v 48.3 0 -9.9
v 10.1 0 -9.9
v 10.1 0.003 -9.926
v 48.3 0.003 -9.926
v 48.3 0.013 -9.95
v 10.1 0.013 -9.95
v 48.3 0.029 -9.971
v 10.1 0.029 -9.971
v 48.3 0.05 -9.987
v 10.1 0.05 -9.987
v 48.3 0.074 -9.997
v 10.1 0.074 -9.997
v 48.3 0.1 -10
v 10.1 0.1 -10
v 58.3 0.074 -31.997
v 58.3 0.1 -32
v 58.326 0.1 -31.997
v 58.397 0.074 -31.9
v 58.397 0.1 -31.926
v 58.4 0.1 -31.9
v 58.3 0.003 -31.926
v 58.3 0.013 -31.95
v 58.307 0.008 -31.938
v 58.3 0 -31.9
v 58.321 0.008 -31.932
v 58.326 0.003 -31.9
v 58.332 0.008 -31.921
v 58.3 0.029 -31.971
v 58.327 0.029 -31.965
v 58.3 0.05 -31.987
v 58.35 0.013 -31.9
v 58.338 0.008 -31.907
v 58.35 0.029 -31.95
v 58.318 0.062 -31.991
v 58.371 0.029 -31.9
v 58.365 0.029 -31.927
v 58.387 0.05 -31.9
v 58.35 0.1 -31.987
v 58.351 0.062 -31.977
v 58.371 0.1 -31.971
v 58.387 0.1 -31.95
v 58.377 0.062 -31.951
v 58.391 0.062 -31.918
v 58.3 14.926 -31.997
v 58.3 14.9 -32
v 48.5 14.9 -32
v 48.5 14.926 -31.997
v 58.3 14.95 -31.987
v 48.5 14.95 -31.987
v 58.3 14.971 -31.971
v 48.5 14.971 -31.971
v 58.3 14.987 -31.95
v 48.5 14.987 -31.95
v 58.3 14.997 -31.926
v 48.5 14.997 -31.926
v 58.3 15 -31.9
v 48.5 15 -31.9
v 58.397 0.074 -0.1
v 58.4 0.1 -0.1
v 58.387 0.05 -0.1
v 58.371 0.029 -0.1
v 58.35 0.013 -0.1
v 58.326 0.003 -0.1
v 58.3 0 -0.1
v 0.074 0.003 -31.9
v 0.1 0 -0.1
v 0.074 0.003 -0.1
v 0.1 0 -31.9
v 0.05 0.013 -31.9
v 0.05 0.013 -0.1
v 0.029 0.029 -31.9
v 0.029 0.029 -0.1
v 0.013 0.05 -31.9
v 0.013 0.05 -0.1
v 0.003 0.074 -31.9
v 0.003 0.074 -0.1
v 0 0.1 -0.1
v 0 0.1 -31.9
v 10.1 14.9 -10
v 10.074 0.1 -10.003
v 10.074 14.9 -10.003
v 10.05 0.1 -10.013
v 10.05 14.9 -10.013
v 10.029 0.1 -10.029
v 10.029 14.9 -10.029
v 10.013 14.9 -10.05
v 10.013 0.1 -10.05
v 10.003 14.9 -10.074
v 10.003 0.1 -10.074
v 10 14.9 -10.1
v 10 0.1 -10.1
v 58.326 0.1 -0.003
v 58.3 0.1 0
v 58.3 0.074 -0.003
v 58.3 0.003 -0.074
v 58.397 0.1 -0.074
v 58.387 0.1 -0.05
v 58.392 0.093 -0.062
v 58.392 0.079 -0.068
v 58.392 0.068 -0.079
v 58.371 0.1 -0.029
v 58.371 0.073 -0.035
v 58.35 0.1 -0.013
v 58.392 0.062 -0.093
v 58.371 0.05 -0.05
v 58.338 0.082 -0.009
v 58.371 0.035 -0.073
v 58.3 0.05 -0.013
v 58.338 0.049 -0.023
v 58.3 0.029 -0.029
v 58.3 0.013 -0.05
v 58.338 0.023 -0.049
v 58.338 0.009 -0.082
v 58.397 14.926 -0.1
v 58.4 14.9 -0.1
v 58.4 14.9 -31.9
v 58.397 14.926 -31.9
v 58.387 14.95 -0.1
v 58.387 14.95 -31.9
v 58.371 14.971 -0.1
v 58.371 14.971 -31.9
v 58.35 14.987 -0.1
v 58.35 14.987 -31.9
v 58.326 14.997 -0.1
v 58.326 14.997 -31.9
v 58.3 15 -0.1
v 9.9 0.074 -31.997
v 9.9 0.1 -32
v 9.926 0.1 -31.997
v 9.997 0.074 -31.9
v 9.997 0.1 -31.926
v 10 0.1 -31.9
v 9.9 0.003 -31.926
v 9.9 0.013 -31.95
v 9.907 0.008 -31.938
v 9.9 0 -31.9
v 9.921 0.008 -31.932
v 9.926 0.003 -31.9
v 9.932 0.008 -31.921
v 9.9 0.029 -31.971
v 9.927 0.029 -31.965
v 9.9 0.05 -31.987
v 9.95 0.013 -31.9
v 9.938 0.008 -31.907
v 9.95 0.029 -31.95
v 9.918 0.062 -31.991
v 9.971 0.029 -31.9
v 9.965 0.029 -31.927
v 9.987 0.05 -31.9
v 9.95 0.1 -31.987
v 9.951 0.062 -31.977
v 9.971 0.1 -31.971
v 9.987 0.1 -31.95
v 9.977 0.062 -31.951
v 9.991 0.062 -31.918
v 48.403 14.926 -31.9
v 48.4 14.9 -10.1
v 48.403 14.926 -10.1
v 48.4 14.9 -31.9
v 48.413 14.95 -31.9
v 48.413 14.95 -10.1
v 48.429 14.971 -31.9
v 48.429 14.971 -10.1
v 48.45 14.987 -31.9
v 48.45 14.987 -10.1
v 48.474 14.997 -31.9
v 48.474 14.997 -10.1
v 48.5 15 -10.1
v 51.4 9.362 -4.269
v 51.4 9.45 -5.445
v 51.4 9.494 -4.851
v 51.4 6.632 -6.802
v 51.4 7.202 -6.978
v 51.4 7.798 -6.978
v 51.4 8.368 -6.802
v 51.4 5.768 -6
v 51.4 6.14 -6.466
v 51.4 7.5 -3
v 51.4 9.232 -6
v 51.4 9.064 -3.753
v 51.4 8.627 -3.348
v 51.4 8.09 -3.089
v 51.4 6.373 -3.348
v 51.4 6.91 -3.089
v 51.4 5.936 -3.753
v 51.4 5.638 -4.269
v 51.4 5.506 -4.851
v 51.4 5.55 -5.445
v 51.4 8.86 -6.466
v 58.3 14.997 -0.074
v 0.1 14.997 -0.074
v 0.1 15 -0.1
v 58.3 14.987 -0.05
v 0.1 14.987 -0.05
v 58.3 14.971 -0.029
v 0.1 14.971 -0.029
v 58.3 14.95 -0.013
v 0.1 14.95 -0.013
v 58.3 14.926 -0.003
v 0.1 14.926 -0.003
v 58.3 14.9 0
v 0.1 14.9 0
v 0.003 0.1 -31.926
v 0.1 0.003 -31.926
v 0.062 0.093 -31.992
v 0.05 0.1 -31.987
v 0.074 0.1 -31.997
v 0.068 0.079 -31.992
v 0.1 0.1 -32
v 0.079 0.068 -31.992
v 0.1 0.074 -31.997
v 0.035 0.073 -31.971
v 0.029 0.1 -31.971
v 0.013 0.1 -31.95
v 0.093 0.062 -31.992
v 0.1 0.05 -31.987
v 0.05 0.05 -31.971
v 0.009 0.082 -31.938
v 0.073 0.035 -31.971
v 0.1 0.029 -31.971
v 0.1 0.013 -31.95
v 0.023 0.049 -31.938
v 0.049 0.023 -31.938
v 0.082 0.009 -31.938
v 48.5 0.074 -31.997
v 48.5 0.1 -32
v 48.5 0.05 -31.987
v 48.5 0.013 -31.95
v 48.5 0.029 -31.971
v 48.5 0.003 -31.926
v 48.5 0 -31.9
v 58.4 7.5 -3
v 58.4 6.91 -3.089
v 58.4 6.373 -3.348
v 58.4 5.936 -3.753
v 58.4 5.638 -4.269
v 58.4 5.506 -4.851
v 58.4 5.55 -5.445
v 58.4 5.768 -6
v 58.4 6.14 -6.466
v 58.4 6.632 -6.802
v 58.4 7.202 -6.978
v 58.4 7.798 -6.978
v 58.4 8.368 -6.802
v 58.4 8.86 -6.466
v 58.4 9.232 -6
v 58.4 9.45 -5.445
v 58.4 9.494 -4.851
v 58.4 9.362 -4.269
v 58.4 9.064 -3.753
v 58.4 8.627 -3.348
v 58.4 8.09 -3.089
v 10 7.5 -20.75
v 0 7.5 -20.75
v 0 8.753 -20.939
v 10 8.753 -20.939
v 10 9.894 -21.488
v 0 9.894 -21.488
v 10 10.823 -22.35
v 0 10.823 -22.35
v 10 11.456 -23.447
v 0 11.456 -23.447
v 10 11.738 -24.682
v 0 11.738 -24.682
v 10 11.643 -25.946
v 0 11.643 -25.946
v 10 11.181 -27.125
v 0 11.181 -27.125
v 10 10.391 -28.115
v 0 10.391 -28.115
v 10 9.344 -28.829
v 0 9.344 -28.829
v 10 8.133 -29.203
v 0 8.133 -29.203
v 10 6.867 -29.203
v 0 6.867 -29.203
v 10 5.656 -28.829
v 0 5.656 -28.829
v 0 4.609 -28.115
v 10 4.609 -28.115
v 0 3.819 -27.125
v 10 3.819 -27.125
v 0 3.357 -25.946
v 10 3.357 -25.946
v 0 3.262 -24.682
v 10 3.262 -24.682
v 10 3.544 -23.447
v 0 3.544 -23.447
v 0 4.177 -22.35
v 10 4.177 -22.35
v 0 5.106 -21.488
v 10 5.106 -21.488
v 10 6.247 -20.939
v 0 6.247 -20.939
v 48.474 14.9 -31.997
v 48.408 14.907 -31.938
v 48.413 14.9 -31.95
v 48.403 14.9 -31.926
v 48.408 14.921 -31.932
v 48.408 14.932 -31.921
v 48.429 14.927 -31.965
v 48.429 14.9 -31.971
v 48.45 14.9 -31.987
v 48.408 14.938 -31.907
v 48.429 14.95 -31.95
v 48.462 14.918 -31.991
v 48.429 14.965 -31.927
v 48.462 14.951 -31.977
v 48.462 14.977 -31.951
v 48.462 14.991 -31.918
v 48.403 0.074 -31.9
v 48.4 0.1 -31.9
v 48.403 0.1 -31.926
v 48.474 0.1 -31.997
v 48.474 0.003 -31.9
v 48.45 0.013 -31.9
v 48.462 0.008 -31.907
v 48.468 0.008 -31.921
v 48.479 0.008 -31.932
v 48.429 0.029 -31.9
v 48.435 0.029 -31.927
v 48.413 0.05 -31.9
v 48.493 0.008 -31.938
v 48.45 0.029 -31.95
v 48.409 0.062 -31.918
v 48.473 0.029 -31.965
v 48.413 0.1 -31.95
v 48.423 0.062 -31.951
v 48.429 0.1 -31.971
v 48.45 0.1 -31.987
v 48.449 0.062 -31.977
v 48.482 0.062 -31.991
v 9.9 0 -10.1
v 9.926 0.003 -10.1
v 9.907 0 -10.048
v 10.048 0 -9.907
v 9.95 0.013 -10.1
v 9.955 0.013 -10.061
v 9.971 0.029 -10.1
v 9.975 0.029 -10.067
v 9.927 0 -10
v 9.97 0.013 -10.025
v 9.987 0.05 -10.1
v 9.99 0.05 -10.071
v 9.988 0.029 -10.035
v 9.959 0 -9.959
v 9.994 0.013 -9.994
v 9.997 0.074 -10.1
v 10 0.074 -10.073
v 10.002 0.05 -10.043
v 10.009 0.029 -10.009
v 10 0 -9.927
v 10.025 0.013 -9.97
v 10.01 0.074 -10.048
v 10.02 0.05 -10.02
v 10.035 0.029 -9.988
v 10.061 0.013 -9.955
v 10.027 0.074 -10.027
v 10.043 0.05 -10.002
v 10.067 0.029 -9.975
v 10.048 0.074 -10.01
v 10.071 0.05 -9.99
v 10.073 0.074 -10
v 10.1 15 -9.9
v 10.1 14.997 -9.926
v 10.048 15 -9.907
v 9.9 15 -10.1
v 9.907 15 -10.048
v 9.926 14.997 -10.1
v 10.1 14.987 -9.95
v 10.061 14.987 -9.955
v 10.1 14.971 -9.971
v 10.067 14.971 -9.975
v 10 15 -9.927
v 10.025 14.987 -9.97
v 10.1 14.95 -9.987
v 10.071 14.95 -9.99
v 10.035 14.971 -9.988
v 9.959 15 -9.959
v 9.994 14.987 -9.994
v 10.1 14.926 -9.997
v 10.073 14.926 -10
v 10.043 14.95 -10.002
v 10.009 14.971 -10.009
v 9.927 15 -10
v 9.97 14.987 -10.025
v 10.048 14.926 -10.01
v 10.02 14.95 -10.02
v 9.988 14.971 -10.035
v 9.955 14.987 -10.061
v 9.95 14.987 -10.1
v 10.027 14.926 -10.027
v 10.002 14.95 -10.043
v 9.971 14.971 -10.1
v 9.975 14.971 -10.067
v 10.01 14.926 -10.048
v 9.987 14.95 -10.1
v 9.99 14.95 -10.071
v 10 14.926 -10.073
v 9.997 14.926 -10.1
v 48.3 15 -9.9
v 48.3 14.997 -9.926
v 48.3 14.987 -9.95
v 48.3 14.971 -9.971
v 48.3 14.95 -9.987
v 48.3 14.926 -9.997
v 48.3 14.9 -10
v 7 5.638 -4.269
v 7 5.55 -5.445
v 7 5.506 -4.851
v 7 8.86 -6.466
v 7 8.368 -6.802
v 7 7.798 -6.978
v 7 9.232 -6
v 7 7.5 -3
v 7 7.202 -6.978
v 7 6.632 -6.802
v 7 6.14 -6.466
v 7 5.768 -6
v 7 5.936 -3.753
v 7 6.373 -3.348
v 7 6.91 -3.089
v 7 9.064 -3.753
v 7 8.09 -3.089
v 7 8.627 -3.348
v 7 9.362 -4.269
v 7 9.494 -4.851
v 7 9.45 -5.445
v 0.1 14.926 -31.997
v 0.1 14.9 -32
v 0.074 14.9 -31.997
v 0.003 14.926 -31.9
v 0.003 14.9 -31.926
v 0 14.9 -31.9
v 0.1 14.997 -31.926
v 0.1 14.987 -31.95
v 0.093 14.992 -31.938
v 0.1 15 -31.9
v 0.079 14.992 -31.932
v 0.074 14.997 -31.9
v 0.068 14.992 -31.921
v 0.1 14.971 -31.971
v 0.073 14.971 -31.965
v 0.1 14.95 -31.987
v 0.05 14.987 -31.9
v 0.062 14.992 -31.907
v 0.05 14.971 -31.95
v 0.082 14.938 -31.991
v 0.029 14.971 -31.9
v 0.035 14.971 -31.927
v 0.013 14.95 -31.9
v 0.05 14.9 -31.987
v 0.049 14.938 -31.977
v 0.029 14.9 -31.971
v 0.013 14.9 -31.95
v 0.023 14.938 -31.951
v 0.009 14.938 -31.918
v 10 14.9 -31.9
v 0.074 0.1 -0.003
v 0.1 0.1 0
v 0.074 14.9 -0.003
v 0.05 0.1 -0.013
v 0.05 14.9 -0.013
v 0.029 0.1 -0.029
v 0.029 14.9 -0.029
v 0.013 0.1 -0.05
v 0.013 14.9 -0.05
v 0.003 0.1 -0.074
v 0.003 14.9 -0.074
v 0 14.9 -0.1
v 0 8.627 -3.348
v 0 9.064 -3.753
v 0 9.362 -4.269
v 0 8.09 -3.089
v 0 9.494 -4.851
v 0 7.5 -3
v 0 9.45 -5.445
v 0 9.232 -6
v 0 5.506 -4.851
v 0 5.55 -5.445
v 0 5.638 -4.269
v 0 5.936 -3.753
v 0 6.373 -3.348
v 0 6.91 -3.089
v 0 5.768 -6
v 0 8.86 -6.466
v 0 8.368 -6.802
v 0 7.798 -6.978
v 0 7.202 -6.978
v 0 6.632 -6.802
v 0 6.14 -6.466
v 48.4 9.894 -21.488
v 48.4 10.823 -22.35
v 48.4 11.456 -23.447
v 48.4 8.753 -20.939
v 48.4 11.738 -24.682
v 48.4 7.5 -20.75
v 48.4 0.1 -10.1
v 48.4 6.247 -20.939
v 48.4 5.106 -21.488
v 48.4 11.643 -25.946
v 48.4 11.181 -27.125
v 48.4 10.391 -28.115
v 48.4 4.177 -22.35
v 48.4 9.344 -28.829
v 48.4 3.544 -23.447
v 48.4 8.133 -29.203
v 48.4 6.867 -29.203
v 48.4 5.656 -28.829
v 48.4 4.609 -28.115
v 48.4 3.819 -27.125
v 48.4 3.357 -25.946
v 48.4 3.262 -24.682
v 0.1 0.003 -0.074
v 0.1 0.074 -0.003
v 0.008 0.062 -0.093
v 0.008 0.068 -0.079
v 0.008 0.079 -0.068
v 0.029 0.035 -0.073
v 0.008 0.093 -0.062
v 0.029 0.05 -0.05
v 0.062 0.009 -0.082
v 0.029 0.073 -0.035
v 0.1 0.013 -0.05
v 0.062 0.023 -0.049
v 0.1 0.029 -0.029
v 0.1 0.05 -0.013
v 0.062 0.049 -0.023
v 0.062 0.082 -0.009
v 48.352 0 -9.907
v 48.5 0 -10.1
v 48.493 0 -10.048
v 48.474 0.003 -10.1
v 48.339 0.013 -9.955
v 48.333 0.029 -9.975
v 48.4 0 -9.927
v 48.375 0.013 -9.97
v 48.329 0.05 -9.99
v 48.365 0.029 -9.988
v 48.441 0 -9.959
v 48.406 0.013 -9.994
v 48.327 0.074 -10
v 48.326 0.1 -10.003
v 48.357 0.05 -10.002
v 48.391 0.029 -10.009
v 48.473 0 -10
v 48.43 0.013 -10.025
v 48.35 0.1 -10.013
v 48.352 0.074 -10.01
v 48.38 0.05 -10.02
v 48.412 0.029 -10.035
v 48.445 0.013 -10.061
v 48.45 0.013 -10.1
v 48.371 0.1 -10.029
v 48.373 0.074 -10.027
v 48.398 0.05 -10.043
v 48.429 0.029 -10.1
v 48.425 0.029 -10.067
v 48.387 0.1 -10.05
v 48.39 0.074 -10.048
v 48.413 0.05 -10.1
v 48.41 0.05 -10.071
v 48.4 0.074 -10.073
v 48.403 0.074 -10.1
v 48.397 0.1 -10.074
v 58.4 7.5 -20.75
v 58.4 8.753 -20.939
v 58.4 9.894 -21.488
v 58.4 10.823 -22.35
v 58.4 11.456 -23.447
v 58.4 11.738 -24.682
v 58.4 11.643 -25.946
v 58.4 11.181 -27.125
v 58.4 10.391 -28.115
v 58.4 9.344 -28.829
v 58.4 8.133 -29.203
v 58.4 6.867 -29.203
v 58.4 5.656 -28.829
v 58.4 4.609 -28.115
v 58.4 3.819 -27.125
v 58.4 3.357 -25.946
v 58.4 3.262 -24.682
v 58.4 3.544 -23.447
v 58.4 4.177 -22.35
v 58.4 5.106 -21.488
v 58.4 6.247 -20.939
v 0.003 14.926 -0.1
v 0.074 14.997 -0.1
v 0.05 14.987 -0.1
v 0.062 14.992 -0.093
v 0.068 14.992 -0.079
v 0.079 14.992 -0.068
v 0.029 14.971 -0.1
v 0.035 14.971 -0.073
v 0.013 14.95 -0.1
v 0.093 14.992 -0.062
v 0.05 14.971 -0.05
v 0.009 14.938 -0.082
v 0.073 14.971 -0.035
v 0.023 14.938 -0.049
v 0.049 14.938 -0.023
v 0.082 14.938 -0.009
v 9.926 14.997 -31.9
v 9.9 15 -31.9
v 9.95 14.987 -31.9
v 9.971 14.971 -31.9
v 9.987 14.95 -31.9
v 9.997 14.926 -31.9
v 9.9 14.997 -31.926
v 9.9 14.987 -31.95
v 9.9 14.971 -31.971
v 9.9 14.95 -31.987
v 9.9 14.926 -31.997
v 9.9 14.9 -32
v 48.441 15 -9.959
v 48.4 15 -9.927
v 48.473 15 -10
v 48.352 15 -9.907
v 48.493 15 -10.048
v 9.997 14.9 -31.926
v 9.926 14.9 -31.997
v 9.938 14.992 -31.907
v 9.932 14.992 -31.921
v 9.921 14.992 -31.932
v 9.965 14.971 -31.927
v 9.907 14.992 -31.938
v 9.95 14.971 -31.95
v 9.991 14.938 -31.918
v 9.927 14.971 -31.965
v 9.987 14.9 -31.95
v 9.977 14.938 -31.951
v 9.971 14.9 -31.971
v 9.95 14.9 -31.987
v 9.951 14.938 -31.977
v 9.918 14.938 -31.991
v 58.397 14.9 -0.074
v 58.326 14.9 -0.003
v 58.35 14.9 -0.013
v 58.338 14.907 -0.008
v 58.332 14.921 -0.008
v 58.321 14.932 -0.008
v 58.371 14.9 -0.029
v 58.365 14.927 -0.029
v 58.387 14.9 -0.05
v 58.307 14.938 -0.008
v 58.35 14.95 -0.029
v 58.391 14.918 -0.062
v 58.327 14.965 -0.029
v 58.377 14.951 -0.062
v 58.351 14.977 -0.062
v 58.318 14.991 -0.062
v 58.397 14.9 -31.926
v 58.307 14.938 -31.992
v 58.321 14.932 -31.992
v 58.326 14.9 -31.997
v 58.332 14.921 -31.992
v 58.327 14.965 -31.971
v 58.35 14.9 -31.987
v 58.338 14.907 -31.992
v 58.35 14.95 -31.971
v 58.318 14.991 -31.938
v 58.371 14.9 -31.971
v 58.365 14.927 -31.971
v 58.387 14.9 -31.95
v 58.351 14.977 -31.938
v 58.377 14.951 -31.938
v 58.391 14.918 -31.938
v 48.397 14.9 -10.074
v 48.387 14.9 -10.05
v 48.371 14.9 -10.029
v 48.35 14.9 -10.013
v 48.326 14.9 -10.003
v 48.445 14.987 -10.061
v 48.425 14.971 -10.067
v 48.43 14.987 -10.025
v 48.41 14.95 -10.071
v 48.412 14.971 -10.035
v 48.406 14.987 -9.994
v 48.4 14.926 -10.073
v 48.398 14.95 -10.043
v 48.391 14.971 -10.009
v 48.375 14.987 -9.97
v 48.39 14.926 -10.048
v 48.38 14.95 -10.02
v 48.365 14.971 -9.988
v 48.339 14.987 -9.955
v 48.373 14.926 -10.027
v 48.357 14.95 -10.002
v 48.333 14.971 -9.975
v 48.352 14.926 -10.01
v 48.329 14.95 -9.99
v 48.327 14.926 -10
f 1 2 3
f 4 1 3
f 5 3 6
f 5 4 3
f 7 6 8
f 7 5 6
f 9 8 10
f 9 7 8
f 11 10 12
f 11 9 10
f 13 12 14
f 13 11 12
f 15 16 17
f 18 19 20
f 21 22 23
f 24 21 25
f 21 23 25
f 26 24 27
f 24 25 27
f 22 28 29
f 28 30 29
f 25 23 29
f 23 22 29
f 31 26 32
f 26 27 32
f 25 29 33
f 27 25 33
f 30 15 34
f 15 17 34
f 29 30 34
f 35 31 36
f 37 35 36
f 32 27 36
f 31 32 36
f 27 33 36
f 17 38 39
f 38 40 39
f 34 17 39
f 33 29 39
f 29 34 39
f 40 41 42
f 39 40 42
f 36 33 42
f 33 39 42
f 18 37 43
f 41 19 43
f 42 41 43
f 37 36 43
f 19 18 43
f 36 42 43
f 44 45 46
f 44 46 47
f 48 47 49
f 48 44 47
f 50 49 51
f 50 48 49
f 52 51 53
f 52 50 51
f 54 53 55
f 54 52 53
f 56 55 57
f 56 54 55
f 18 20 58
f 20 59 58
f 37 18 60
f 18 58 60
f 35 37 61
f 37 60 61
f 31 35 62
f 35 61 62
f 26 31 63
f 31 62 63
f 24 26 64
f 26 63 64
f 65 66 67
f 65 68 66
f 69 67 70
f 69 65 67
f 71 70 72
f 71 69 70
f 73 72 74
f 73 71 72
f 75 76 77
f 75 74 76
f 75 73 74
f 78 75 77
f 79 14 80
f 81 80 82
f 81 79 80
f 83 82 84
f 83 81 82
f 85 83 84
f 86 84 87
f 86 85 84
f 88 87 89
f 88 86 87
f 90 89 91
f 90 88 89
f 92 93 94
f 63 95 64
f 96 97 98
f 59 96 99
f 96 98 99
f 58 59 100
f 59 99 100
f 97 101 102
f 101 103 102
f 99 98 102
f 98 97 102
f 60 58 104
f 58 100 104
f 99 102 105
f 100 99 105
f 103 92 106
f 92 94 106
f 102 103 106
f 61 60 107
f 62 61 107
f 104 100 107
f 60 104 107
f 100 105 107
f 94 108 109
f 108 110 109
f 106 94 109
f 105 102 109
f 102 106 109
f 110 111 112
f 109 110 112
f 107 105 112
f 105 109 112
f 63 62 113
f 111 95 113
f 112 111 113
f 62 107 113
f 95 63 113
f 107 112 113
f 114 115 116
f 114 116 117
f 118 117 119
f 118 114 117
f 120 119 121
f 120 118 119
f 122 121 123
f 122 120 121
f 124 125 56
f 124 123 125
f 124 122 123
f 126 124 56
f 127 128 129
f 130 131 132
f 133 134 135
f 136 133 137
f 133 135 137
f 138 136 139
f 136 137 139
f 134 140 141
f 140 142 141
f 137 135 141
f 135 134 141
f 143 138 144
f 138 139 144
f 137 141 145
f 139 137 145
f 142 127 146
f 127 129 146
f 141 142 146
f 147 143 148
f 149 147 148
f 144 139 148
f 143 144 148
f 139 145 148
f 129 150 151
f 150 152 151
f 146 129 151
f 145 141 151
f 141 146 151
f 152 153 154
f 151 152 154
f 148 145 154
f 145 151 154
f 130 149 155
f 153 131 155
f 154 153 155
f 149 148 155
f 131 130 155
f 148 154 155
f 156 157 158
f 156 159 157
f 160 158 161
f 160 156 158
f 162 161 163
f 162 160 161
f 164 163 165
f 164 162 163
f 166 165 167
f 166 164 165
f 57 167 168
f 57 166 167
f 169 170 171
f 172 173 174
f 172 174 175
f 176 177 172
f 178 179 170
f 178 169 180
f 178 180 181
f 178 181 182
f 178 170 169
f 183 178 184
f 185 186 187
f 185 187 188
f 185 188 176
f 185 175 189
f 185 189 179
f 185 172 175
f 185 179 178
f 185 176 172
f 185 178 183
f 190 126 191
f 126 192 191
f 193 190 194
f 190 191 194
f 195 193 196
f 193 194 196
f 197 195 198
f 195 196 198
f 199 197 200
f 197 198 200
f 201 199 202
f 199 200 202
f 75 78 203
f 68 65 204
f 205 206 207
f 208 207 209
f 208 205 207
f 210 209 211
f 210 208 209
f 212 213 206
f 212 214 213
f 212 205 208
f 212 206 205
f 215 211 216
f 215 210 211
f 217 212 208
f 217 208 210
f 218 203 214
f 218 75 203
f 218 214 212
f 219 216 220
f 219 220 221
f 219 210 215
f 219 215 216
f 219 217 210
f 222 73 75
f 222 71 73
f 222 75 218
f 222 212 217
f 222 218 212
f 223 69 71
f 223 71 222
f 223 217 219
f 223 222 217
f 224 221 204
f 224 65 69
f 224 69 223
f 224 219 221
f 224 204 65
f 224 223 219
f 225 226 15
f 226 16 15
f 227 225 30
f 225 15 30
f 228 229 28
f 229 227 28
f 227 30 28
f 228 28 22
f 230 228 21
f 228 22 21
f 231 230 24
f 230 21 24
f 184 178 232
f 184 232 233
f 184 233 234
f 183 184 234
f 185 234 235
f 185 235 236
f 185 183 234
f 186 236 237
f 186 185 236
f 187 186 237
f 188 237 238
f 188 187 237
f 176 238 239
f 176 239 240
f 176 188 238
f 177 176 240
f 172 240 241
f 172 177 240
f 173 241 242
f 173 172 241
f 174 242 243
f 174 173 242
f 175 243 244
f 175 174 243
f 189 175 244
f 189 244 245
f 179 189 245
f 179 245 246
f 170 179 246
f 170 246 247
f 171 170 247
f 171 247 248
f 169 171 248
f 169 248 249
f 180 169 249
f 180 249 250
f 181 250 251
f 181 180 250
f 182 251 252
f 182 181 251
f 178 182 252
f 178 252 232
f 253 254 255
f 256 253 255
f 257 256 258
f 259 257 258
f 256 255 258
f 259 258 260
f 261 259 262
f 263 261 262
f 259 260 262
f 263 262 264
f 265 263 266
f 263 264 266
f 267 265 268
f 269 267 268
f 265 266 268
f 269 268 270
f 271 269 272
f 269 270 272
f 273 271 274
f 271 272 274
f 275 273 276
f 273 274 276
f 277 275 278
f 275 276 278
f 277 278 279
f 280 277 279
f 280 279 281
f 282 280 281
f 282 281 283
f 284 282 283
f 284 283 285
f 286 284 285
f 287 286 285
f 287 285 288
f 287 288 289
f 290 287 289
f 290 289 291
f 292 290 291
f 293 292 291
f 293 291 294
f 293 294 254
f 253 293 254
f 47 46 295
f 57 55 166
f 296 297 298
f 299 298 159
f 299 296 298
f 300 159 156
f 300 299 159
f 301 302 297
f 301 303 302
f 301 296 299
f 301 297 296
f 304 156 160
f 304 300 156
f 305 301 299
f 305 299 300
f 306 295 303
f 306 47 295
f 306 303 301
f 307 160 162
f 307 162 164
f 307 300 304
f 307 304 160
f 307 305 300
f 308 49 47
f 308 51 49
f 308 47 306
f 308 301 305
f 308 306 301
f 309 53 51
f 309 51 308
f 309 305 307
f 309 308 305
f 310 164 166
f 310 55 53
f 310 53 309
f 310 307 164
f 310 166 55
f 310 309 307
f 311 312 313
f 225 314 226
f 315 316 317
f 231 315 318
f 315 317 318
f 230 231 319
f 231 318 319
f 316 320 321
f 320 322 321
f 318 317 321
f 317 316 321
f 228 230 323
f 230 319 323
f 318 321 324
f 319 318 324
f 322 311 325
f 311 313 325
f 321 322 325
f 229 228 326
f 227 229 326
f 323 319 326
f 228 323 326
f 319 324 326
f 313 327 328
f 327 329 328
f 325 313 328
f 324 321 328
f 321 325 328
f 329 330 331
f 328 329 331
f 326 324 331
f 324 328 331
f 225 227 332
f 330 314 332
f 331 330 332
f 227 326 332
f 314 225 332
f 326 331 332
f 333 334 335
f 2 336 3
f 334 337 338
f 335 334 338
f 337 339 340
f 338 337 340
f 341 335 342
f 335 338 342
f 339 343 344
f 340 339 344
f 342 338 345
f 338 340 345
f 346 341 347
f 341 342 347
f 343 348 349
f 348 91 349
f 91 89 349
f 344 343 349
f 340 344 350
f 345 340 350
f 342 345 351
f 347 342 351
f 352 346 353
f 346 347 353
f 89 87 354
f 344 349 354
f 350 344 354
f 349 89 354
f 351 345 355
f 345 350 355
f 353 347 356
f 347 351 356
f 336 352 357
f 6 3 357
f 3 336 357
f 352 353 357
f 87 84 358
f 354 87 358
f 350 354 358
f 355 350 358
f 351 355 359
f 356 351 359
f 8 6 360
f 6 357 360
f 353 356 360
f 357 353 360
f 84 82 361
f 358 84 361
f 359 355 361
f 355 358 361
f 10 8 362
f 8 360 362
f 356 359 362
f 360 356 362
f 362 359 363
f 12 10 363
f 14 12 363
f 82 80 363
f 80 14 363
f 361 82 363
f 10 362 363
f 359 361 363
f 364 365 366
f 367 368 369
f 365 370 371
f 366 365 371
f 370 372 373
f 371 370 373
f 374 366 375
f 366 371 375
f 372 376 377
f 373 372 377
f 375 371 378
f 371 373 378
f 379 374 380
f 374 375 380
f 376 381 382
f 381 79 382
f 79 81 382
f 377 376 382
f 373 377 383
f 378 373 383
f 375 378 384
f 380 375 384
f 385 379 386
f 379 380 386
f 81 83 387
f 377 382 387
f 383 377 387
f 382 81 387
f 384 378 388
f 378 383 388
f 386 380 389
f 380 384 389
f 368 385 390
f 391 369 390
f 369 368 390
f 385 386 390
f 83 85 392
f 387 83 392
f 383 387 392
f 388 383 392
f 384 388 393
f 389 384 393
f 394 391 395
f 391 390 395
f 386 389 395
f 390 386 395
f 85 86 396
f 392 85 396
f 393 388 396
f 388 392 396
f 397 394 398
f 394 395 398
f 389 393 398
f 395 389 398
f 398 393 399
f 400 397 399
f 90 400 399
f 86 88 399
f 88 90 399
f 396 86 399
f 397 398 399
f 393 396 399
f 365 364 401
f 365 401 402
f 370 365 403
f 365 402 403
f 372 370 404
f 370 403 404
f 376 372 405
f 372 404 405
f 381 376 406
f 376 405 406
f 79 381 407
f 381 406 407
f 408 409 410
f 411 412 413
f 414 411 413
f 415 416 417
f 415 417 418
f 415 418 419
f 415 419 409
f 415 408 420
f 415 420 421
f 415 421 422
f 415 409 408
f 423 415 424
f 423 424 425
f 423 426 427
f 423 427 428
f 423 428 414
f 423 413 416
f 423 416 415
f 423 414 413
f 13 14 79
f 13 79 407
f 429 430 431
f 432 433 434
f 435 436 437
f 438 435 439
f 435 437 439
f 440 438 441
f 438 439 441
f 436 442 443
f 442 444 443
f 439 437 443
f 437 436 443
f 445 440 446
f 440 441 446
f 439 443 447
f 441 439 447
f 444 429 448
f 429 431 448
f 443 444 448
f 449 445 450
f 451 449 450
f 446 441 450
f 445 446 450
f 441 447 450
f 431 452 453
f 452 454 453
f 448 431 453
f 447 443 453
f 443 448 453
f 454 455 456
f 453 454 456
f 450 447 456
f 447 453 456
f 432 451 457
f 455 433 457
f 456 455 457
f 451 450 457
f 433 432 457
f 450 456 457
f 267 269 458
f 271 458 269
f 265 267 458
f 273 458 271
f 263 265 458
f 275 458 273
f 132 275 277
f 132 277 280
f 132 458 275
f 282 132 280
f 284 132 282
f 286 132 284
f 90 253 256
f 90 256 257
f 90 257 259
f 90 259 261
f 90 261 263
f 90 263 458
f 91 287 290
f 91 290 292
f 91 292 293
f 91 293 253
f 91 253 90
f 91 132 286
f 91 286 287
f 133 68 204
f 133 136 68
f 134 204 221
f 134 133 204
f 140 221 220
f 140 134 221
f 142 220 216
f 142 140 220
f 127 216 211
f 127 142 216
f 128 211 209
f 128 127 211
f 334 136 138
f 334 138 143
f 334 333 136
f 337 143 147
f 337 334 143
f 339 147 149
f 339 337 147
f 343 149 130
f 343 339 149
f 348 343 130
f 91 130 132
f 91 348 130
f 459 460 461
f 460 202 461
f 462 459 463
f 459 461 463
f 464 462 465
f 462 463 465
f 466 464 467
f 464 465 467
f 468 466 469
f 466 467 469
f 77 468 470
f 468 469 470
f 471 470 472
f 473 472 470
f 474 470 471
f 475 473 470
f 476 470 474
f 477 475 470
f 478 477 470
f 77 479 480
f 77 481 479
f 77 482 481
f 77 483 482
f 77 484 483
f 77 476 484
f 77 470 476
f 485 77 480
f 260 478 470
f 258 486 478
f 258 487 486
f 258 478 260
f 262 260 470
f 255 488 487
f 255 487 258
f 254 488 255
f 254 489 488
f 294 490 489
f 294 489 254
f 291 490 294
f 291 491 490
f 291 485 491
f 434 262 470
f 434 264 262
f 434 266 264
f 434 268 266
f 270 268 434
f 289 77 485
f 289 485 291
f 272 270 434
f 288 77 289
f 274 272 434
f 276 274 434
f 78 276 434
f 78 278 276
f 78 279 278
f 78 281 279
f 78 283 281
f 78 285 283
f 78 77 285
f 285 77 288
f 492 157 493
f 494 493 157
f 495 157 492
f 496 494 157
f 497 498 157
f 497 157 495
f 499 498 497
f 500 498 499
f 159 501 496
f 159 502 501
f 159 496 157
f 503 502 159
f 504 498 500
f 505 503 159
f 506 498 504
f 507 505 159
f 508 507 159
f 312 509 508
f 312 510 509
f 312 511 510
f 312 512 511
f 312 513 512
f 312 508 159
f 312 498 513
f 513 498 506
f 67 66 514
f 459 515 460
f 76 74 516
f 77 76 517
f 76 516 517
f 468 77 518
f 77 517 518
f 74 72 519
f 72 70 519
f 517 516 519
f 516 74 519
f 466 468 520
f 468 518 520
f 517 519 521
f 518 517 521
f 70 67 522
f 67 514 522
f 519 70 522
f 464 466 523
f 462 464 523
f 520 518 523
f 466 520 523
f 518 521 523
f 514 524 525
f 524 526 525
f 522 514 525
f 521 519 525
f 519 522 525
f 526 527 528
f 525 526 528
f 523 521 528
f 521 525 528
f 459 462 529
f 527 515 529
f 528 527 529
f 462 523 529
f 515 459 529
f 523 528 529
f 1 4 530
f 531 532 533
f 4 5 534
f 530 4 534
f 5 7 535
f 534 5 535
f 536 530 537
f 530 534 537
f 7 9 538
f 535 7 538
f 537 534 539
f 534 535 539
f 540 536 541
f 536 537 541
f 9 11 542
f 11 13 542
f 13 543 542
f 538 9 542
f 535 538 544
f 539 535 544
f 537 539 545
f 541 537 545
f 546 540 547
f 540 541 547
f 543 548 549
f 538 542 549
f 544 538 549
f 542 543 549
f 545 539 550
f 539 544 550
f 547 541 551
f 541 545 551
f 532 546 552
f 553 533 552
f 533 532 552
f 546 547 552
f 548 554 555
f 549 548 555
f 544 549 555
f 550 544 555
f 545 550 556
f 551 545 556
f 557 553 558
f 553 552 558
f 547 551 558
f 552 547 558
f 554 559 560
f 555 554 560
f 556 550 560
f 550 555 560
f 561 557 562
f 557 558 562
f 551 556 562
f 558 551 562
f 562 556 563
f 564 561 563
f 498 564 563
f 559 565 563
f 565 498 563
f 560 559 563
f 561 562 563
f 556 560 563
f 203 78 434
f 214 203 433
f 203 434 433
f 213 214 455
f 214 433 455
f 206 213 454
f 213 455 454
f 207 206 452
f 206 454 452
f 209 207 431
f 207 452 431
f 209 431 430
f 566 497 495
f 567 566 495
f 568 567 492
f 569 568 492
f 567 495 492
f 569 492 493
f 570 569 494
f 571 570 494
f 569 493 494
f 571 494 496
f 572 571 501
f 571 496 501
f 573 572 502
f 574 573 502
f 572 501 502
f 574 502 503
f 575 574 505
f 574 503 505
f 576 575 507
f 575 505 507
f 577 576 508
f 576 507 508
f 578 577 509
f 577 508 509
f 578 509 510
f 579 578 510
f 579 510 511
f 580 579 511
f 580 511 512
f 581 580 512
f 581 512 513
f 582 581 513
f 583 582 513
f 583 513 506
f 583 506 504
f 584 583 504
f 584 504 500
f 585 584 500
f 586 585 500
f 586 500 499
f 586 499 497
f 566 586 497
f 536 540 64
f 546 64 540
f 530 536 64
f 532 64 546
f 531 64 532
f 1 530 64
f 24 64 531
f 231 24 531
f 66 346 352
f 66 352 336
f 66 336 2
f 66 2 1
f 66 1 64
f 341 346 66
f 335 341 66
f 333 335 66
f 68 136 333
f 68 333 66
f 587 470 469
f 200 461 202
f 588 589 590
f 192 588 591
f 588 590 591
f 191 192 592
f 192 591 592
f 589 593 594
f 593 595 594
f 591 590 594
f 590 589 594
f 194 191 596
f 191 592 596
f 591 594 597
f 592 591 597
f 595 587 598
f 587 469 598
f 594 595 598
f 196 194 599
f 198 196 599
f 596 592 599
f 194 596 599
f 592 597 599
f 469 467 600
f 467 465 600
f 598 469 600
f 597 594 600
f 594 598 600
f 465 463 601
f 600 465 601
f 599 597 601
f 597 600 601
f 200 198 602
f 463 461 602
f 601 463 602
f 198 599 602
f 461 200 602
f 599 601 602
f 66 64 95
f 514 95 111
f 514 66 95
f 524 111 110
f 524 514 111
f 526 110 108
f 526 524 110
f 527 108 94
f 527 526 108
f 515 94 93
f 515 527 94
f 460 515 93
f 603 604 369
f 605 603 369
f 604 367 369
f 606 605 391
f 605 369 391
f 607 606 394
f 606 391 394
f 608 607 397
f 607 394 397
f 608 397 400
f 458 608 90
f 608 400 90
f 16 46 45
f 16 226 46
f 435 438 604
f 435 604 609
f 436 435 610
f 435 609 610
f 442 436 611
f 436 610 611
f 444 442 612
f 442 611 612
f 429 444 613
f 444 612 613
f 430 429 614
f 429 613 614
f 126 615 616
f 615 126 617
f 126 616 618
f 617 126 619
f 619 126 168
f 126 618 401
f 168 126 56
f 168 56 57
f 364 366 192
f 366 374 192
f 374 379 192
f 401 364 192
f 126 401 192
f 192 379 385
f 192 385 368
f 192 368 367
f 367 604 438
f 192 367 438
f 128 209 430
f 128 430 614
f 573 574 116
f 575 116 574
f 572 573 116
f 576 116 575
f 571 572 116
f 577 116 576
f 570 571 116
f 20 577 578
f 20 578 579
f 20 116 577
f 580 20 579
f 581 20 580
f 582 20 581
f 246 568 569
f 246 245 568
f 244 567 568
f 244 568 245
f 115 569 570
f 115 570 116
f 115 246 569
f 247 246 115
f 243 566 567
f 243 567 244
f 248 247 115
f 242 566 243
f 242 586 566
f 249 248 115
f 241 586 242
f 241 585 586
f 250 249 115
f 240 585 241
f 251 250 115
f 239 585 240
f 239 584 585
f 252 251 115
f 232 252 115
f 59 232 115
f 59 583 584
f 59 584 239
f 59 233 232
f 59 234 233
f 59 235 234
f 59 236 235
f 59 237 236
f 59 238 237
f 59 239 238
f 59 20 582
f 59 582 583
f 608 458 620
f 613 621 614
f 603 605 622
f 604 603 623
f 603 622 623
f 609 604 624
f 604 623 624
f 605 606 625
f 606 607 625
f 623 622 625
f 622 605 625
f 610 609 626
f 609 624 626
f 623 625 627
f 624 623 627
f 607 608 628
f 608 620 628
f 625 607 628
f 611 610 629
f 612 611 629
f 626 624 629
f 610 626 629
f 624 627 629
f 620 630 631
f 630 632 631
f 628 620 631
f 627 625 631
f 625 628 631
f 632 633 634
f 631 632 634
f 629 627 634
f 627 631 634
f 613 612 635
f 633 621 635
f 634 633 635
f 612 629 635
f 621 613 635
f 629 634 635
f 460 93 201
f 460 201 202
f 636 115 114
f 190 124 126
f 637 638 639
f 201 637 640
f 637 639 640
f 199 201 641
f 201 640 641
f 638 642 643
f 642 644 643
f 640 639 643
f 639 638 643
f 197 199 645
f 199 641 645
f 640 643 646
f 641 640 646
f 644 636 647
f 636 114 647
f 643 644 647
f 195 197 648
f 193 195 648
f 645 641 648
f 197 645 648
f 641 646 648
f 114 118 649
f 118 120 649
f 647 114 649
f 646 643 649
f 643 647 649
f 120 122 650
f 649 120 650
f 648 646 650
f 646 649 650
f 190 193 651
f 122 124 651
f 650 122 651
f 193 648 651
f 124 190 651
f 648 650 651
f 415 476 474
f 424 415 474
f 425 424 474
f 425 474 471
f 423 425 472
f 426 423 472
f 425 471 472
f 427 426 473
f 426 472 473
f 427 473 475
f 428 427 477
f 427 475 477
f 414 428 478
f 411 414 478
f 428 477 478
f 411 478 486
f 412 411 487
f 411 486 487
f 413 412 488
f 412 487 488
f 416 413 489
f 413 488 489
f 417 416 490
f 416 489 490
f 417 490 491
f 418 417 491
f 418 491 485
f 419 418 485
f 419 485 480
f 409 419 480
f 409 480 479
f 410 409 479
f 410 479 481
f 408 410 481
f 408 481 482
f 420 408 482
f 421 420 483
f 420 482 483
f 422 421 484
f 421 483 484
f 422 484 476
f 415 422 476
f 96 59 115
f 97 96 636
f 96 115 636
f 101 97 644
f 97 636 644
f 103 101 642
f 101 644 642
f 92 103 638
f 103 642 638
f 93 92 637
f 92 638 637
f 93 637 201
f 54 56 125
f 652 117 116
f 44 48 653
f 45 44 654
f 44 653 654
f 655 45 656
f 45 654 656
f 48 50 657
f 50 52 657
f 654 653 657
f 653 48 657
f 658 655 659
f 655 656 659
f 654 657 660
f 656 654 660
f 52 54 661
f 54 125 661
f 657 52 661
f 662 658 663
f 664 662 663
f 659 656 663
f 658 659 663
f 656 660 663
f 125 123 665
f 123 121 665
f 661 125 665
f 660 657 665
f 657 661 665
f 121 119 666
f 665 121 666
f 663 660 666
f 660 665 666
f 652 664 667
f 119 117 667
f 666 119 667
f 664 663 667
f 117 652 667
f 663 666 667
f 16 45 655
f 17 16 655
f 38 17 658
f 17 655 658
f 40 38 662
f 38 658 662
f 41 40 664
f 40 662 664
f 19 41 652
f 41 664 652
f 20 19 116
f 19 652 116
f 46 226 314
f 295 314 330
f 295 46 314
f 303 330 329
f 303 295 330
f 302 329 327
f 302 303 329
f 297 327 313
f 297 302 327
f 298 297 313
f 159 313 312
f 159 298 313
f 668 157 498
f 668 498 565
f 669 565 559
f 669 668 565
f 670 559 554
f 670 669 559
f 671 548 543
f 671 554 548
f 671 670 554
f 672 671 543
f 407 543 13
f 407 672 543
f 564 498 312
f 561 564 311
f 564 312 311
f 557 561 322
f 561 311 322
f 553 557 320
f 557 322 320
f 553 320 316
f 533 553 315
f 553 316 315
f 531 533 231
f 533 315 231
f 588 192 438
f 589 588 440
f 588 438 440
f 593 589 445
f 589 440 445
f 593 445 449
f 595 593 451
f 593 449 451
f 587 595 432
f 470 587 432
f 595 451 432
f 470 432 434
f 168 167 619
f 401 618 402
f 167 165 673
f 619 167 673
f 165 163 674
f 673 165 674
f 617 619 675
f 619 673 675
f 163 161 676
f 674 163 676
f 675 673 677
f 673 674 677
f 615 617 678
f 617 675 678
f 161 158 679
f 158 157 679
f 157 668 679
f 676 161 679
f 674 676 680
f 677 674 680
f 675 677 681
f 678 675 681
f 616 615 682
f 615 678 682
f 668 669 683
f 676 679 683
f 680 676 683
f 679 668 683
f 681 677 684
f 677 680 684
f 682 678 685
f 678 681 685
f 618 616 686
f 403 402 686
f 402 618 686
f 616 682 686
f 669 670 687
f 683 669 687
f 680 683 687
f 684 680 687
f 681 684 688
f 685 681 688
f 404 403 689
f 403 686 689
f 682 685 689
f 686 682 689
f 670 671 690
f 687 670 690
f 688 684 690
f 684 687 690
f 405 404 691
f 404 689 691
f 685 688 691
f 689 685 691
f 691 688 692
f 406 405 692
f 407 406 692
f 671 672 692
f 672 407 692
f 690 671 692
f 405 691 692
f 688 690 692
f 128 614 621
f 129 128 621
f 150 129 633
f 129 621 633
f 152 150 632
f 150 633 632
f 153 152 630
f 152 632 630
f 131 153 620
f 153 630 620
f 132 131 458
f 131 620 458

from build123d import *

# Parameters (mm, degrees)
BOSS_EXTRUDE1_DEPTH = 15
SKETCH2_R           = 4.25
CUT_EXTRUDE1_DEPTH  = 69.260969814
SKETCH3_R           = 2
CUT_EXTRUDE2_DEPTH  = 7
CUT_EXTRUDE3_START  = -7
SKETCH4_R           = 2
CUT_EXTRUDE3_DEPTH  = 7
FILLET1_R           = 0.1


with BuildPart() as part:
    # Sketch1 → Boss-Extrude1 (new body)
    with BuildSketch(Plane(origin=(0, 0, 0), x_dir=(1, 0, 0), z_dir=(0, 1, 0))):
        Polygon((48.4, 32), (58.4, 32), (58.4, 0), (0, 0), (0, 32), (10, 32), (10, 10), (48.4, 10), align=None)
    extrude(amount=BOSS_EXTRUDE1_DEPTH)

    # Sketch2 → Cut-Extrude1 (cut, through all)
    with BuildSketch(Plane.ZY):
        with Locations((-25, 7.5)):
            Circle(SKETCH2_R)
    extrude(amount=-CUT_EXTRUDE1_DEPTH, mode=Mode.SUBTRACT)

    # Sketch3 → Cut-Extrude2 (cut)
    with BuildSketch(Plane.ZY):
        with Locations((-5, 7.5)):
            Circle(SKETCH3_R)
    extrude(amount=-CUT_EXTRUDE2_DEPTH, mode=Mode.SUBTRACT)

    # Sketch4 → Cut-Extrude3 (cut)
    with BuildSketch(Plane(origin=(58.4, 0, 0), x_dir=(0, 0, -1), z_dir=(1, 0, 0)).offset(CUT_EXTRUDE3_START)):
        with Locations(Location((5, 7.5, 0), (0, 0, 180))):
            Circle(SKETCH4_R)
    extrude(amount=CUT_EXTRUDE3_DEPTH, mode=Mode.SUBTRACT)

    # Fillet1
    fillet1_edges = [part.edges().sort_by_distance(p)[0] for p in [
        (58.4, 15, -16),
        (29.2, 0, 0),
        (0, 0, -16),
        (53.4, 15, -32),
        (0, 7.5, -32),
        (10, 7.5, -32),
        (10, 7.5, -10),
        (48.4, 7.5, -10),
        (48.4, 7.5, -32),
        (58.4, 7.5, -32),
        (58.4, 7.5, 0),
        (0, 7.5, 0),
        (48.4, 15, -21),
        (29.2, 15, -10),
        (10, 15, -21),
        (5, 15, -32),
        (0, 15, -16),
        (29.2, 15, 0),
        (5, 0, -32),
        (10, 0, -21),
        (29.2, 0, -10),
        (48.4, 0, -21),
        (53.4, 0, -32),
        (58.4, 0, -16),
    ]]
    fillet(fillet1_edges, radius=FILLET1_R)


solid = part.part
